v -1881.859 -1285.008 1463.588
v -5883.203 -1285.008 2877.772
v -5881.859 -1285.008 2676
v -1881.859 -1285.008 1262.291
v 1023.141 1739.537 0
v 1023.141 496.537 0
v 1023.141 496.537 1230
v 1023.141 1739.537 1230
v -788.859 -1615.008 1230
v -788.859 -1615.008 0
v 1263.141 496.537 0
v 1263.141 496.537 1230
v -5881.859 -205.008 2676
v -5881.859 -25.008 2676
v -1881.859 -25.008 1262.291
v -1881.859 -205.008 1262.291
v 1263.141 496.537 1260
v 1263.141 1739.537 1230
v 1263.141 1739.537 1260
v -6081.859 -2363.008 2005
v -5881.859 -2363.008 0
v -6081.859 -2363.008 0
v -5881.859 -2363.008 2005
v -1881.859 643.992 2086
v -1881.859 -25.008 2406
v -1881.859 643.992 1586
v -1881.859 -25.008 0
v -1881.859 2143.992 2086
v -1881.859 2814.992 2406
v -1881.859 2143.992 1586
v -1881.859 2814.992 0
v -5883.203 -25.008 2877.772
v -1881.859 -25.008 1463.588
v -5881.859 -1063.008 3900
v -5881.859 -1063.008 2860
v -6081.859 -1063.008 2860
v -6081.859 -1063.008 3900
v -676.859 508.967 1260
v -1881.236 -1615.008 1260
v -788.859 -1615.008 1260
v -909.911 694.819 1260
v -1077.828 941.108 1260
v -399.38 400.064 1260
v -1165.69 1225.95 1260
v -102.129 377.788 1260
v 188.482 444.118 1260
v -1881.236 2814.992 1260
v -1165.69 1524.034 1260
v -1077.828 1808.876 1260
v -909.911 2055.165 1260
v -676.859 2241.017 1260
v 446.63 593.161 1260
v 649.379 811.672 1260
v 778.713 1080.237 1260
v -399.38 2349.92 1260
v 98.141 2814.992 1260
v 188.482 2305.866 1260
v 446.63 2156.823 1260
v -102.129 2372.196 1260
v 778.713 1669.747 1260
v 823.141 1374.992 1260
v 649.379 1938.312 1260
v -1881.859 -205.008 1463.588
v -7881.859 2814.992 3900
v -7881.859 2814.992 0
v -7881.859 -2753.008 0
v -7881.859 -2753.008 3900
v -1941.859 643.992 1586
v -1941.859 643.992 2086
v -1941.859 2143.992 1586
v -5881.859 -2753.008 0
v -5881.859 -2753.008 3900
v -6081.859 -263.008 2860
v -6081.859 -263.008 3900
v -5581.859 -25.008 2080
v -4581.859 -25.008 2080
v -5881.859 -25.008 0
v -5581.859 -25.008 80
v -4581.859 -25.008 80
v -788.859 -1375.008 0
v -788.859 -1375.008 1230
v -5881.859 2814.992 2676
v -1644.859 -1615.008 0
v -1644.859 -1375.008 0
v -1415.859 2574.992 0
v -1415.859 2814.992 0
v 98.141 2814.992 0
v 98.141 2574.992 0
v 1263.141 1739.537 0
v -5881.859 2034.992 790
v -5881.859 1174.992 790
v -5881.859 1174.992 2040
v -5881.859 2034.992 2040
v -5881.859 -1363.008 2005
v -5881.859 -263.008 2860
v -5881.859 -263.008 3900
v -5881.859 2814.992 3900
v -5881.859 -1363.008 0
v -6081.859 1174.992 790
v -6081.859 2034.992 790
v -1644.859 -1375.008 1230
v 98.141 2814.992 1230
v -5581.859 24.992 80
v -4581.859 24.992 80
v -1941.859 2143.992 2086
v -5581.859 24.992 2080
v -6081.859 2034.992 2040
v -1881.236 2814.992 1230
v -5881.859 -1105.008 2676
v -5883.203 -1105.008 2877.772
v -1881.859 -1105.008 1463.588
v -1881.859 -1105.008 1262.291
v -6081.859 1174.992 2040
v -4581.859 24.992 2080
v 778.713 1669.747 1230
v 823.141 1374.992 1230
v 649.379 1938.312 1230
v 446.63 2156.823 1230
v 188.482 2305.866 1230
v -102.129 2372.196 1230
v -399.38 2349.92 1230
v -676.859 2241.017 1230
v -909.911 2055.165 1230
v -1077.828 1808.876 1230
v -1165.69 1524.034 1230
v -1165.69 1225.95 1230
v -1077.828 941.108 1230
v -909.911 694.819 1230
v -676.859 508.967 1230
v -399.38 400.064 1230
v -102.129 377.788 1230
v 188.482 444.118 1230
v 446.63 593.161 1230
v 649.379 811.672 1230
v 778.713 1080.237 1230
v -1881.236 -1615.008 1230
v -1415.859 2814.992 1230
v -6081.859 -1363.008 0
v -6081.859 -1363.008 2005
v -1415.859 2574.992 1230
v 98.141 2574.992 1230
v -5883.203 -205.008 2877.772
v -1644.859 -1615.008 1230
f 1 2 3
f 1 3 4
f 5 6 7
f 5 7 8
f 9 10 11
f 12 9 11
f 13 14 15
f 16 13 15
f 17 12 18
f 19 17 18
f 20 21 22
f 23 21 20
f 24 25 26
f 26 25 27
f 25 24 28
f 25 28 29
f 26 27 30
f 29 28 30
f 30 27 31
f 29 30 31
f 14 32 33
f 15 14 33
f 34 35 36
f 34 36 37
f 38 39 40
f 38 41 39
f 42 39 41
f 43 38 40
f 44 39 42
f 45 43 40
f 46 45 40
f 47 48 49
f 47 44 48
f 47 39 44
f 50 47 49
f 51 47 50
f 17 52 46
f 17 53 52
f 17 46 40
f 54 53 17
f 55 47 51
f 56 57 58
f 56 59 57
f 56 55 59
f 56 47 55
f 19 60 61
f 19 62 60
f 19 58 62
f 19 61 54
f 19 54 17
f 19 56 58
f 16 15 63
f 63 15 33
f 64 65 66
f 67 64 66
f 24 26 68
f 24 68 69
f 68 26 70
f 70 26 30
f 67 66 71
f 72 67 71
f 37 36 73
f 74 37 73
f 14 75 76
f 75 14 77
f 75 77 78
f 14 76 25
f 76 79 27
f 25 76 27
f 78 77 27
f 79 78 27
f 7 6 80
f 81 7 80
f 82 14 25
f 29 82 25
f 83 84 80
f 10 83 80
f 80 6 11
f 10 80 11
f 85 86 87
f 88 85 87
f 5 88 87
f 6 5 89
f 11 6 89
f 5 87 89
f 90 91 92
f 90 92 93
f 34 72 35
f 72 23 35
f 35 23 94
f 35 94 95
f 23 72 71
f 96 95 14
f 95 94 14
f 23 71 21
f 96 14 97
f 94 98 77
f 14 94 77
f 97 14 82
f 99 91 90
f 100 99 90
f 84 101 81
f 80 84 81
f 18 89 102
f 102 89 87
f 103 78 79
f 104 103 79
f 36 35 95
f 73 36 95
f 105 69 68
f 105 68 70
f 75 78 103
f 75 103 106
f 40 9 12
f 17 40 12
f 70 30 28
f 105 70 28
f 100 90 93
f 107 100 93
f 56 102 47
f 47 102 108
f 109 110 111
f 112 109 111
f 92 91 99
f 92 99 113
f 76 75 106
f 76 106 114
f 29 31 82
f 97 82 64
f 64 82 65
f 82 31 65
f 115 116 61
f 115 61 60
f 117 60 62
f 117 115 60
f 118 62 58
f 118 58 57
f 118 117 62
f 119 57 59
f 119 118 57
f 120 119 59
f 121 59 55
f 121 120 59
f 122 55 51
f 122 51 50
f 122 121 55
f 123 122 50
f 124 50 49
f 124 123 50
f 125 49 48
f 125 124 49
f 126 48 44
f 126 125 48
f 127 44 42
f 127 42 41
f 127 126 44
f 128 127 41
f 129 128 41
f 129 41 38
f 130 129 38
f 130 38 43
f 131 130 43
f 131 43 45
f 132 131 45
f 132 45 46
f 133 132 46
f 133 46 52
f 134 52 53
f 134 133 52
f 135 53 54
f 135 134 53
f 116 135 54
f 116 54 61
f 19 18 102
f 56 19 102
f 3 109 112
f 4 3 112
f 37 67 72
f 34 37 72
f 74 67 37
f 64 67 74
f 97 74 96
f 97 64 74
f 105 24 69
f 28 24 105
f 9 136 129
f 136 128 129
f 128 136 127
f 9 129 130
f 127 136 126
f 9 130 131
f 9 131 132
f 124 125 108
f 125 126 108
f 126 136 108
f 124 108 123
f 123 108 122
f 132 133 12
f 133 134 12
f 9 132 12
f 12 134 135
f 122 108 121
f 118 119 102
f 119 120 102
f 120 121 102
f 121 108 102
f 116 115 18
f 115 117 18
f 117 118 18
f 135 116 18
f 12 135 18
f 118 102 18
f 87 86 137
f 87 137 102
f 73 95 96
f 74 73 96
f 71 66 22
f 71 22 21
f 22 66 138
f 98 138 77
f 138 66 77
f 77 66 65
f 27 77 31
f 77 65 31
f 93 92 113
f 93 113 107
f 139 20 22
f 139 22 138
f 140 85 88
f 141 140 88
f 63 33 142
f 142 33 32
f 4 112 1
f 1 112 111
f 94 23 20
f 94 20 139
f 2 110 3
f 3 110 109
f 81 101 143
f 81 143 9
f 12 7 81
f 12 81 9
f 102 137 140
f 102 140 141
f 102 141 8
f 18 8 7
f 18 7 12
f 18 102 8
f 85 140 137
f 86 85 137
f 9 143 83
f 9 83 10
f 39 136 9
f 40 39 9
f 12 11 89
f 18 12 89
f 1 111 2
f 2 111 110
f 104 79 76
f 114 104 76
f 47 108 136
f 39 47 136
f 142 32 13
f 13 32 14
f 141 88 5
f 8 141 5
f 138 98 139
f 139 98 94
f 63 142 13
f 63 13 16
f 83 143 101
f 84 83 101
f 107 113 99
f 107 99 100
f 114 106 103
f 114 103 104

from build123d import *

# Parameters (mm, degrees)
F0_W      = 1514
F0_H      = 240
F0_W_2    = 240
F0_H_2    = 1243
F0_W_3    = 856
F1_DEPTH  = 1230
F2_DEPTH  = 3900
F3_W      = 1000
F3_H      = 2005
F4_DEPTH  = 200
F5_W      = 860
F5_H      = 1250
F6_DEPTH  = 200
F7_W      = 800
F7_H      = 1040
F8_DEPTH  = 200
F0_W_4    = 4000
F0_H_3    = 2840
F10_DEPTH = 2676
F12_DEPTH = 3620
F9_R      = 1000
F13_DEPTH = 30
F15_DEPTH = 180
F17_START = 900
F17_DEPTH = 180
F18_W     = 1000
F18_H     = 2000
F19_DEPTH = 50
F20_W     = 1500
F20_H     = 500
F21_DEPTH = 60


with BuildPart() as f1:
    # F0 (on Top) → F1 (new body)
    with BuildSketch(Plane.XY):
        with Locations((-658.8594744233, 2694.9919849969)):
            Rectangle(F0_W, F0_H)
        with Locations((1143.1405255767, 1118.037068611)):
            Rectangle(F0_W_2, F0_H_2)
        Polygon((1263.1405255767, 1739.537068611), (98.1405255767, 2814.9919849969), (98.1405255767, 2574.9919849969), (1023.1405255767, 1739.537068611), align=None)
        Polygon((-788.8594744233, -1615.0080150031), (1263.1405255767, 496.537068611), (1023.1405255767, 496.537068611), (-788.8594744233, -1375.0080150031), align=None)
        with Locations((-1216.8594744233, -1495.0080150031)):
            Rectangle(F0_W_3, F0_H)
    extrude(amount=F1_DEPTH)


with BuildPart() as f2:
    # F0 (on Top) → F2 (new body)
    with BuildSketch(Plane.XY):
        Polygon((-7881.8594744233, 2814.9919849969), (-7881.8594744233, -2753.0080150031), (-5881.8594744233, -2753.0080150031), (-5881.8594744233, -25.0080150031), (-5881.8594744233, 2814.9919849969), align=None)
    extrude(amount=F2_DEPTH)

    # F3 (on face) → F4 (cut)
    with BuildSketch(Plane.YZ.offset(-5881.8594744233)):
        with Locations((-1863.0080150031, 1002.5)):
            Rectangle(F3_W, F3_H)
    extrude(amount=-F4_DEPTH, mode=Mode.SUBTRACT)

    # F5 (on face) → F6 (cut)
    with BuildSketch(Plane.YZ.offset(-5881.8594744233)):
        with Locations((1604.9919849969, 1415)):
            Rectangle(F5_W, F5_H)
    extrude(amount=-F6_DEPTH, mode=Mode.SUBTRACT)

    # F7 (on face) → F8 (cut)
    with BuildSketch(Plane.YZ.offset(-5881.8594744233)):
        with Locations((-663.0080150031, 3380)):
            Rectangle(F7_W, F7_H)
    extrude(amount=-F8_DEPTH, mode=Mode.SUBTRACT)

    # F0 (on Top) → F10 (join)
    with BuildSketch(Plane.XY):
        with Locations((-3881.8594744233, 1394.9919849969)):
            Rectangle(F0_W_4, F0_H_3)
    extrude(amount=F10_DEPTH)

    # F11 (on face) → F12 (cut)
    with BuildSketch(Plane.XZ.offset(25.0080150031)):
        Polygon((-1881.8594744233, 2676), (-5881.8594744233, 2676), (-1881.8594744233, 2406), align=None)
    extrude(amount=-F12_DEPTH, mode=Mode.SUBTRACT)

    # F18 (on face) → F19 (cut)
    with BuildSketch(Plane.XZ.offset(25.0080150031)):
        with Locations((-5081.8594744233, 1080)):
            Rectangle(F18_W, F18_H)
    extrude(amount=-F19_DEPTH, mode=Mode.SUBTRACT)

    # F20 (on face) → F21 (cut)
    with BuildSketch(Plane.YZ.offset(-1881.8594744233)):
        with Locations((1393.9919849969, 1836)):
            Rectangle(F20_W, F20_H)
    extrude(amount=-F21_DEPTH, mode=Mode.SUBTRACT)


with BuildPart() as f13:
    # F9 (on face) → F13 (new body)
    with BuildSketch(Plane.XY.offset(1230)):
        Polygon((-1415.8594744233, 2574.9919849969), (-1415.8594744233, 2814.9919849969), (-1881.236076355, 2814.9919849969), (-1881.236076355, -1615.0080150031), (-1644.8594744233, -1615.0080150031), (-1644.8594744233, -1375.0080150031), (-788.8594744233, -1375.0080150031), (1023.1405255767, 496.537068611), (1023.1405255767, 1739.537068611), (98.1405255767, 2574.9919849969), align=None)
        with Locations((-176.8594744233, 1374.9919849969)):
            Circle(F9_R, mode=Mode.SUBTRACT)
        Polygon((1263.1405255767, 1739.537068611), (98.1405255767, 2814.9919849969), (-1415.8594744233, 2814.9919849969), (-1415.8594744233, 2574.9919849969), (98.1405255767, 2574.9919849969), (1023.1405255767, 1739.537068611), (1023.1405255767, 496.537068611), (-788.8594744233, -1375.0080150031), (-1644.8594744233, -1375.0080150031), (-1644.8594744233, -1615.0080150031), (-788.8594744233, -1615.0080150031), (1263.1405255767, 496.537068611), align=None)
    extrude(amount=F13_DEPTH)


with BuildPart() as f15:
    # F14 (on face) → F15 (new body)
    with BuildSketch(Plane.XZ.offset(25.0080150031)):
        Polygon((-5883.2034006143, 2877.7721783601), (-5881.8594744233, 2676), (-5177.8442322609, 2628.478971154), align=None)
        Polygon((-5177.8442322609, 2628.478971154), (-5881.8594744233, 2676), (-1881.8594744233, 1262.2906820192), (-1881.8594744233, 1463.5878801346), align=None)
    extrude(amount=F15_DEPTH)


with BuildPart() as f17:
    # F16 (on face) → F17 (new body)
    with BuildSketch(Plane.XZ.offset(205.0080150031).offset(F17_START)):
        Polygon((-1881.8594744233, 1463.5878801346), (-5883.2034006143, 2877.7721783601), (-5881.8594744233, 2676), (-1881.8594744233, 1262.2906820192), align=None)
    extrude(amount=F17_DEPTH)


solid = Compound([f1.part, f2.part, f13.part, f15.part, f17.part])
